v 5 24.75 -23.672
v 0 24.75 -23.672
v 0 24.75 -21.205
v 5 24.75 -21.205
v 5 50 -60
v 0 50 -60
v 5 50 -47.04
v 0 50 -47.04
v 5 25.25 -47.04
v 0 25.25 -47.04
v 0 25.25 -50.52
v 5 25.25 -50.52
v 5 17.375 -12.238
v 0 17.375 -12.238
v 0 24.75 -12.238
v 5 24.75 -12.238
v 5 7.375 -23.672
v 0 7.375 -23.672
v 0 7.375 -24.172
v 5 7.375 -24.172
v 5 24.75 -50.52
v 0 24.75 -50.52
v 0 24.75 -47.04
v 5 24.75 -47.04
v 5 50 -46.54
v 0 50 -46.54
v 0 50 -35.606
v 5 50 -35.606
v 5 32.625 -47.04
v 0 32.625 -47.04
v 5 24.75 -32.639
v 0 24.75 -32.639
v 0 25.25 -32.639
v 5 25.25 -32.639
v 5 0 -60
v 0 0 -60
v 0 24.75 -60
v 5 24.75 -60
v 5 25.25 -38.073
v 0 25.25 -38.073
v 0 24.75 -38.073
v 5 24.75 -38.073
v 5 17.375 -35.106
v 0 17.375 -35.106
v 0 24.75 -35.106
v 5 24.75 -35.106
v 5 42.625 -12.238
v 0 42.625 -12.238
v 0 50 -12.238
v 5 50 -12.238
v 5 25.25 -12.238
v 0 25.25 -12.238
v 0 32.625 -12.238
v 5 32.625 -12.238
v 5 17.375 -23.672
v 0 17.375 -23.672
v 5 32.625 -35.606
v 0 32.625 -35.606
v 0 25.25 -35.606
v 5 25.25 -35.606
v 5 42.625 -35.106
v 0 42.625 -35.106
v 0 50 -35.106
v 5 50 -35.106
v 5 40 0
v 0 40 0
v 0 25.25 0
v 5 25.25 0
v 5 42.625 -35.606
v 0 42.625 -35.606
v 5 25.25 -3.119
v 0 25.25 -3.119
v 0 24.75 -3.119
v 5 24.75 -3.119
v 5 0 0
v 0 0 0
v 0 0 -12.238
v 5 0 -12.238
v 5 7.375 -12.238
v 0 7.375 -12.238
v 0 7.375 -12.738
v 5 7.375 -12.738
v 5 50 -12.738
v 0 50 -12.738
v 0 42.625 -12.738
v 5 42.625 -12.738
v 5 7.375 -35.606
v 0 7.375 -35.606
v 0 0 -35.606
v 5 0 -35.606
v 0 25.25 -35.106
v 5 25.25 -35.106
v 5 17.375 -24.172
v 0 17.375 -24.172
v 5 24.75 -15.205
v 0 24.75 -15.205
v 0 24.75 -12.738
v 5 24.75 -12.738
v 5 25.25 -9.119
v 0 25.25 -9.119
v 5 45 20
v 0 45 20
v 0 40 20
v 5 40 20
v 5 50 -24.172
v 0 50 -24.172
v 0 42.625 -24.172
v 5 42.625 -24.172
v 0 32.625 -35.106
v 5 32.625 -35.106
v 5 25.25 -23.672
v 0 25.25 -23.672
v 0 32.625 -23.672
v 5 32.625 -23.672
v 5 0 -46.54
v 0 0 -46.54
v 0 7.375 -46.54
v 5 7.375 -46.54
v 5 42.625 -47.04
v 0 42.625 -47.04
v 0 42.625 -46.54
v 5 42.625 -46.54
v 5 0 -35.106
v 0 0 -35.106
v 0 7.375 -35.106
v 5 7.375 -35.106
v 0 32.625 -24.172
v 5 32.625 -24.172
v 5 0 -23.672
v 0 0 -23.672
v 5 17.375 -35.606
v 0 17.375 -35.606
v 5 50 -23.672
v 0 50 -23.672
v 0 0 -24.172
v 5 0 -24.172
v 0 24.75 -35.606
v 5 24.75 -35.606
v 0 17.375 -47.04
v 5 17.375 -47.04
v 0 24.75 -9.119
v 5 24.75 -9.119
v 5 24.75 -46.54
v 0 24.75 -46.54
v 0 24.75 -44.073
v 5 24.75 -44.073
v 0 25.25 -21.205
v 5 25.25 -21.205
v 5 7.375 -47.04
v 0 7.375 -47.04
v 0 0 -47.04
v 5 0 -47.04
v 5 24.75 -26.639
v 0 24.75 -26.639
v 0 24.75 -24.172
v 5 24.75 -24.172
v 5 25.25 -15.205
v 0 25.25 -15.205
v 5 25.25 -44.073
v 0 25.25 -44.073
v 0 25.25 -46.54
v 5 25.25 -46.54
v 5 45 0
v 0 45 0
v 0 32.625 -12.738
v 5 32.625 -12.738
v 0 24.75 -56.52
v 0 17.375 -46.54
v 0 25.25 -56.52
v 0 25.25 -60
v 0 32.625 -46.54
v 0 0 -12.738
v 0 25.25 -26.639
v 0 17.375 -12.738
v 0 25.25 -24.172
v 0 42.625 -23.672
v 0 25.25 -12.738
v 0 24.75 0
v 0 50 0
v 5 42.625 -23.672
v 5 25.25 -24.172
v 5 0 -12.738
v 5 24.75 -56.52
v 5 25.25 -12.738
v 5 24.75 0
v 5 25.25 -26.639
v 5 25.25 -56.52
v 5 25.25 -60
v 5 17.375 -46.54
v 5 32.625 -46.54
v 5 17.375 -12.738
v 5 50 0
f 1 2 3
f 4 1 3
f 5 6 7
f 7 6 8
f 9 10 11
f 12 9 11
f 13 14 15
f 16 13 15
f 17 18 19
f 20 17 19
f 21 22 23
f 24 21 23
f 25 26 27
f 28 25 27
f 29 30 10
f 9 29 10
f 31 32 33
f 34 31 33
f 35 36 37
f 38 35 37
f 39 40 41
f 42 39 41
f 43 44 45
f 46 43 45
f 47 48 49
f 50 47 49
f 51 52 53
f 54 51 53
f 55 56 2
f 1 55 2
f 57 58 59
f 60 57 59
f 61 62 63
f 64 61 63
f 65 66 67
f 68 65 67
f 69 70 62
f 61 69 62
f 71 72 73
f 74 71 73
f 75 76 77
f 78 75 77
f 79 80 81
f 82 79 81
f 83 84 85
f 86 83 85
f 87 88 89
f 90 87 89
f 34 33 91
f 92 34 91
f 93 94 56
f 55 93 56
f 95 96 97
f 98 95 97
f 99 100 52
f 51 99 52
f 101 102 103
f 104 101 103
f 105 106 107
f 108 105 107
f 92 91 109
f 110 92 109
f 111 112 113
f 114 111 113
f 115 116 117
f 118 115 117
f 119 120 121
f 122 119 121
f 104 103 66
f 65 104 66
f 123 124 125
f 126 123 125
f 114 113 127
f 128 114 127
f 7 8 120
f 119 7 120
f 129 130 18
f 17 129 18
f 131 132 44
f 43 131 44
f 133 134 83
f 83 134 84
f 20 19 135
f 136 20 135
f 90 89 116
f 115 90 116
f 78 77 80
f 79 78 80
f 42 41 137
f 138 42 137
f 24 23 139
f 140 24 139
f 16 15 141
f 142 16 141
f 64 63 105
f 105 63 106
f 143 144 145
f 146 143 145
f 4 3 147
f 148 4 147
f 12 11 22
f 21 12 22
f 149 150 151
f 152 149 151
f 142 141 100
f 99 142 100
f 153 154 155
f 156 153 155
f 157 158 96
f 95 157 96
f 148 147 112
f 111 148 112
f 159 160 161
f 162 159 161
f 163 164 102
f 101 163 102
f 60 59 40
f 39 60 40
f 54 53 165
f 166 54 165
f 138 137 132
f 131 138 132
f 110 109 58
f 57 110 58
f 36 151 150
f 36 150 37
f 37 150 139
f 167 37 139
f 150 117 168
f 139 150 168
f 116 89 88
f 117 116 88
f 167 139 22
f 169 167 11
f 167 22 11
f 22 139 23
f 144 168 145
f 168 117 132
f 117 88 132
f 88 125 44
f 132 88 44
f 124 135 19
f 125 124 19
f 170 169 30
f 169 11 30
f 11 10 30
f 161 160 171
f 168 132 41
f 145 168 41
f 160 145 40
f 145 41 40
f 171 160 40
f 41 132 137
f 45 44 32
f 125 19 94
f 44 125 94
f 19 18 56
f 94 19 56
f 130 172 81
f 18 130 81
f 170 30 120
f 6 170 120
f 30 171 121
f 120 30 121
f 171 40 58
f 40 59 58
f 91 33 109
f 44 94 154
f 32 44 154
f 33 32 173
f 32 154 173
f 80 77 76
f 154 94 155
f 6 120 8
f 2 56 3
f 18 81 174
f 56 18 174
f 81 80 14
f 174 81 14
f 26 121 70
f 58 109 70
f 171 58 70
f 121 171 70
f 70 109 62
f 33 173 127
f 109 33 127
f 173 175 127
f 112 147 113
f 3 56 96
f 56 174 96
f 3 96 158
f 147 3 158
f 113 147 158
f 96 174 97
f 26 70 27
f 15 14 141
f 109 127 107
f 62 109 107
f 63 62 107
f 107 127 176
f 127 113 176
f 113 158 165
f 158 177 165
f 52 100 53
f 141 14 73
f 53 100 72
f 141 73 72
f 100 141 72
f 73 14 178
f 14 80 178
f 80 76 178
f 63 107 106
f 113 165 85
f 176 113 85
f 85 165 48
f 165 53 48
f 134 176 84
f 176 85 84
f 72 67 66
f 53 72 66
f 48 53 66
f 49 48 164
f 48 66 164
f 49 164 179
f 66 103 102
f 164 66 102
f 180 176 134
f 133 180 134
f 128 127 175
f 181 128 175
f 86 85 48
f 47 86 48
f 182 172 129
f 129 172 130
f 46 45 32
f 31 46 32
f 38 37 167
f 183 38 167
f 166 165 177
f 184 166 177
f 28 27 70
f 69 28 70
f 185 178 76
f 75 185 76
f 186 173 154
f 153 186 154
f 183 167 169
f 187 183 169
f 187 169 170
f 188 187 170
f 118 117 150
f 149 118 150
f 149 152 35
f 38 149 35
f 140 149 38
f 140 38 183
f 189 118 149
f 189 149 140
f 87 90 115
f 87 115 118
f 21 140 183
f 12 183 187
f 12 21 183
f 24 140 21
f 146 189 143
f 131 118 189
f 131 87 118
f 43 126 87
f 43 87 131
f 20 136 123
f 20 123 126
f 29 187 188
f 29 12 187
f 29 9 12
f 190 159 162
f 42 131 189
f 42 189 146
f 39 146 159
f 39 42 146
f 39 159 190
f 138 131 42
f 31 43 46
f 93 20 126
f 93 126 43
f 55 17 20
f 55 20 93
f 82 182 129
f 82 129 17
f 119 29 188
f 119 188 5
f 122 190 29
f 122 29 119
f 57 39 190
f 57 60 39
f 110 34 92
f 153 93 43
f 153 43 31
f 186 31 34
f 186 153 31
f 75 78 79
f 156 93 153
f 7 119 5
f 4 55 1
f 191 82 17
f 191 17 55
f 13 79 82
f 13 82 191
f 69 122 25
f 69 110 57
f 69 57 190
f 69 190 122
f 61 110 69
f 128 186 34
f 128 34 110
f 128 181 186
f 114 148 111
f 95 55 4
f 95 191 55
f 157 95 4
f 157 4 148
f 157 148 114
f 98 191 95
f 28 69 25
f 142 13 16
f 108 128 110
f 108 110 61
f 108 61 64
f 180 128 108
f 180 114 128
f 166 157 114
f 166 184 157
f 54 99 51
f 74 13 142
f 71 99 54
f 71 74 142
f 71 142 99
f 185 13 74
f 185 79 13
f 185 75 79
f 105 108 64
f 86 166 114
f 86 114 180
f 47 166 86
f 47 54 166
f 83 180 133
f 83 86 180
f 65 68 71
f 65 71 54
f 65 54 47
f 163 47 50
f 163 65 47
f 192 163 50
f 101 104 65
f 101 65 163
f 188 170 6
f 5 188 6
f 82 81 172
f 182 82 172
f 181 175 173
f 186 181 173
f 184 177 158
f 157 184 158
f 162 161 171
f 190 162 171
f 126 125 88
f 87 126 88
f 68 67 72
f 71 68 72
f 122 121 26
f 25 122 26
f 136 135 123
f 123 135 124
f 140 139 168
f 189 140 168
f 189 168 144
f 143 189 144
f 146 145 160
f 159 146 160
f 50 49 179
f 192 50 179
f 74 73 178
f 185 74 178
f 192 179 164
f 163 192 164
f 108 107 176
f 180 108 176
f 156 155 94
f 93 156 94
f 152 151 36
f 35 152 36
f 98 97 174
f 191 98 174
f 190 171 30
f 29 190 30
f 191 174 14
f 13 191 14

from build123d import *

# Parameters (mm, degrees)
F1_DEPTH = 5


# Not quite as in the source:
# - a feature names something its author has since deleted; it is built from what else it names


with BuildPart() as f1:
    # F0 (on Right) → F1 (new body)
    with BuildSketch(Plane.YZ):
        Polygon((11.5, 0), (0, 0), (0, -12.238), (7.3750000447, -12.238), (7.3750000447, -12.738), (0, -12.738), (0, -23.672), (7.3750000447, -23.672), (7.3750000447, -24.172), (0, -24.172), (0, -35.106), (7.3750000447, -35.106), (7.3750000447, -35.606), (0, -35.606), (0, -46.54), (7.3750000447, -46.54), (7.3750000447, -47.04), (0, -47.04), (0, -60), (24.75, -60), (24.75, -56.52), (25.25, -56.52), (25.25, -60), (50, -60), (50, -47.04), (42.6249988377, -47.04), (42.6249988377, -46.54), (50, -46.54), (50, -35.606), (42.6249988377, -35.606), (42.6249988377, -35.106), (50, -35.106), (50, -24.172), (42.6249988377, -24.172), (42.6249988377, -23.672), (50, -23.672), (50, -12.738), (42.6249988377, -12.738), (42.6249988377, -12.238), (50, -12.238), (50, 0), (45, 0), (45, 15), (45, 19.999999553), (40, 19.999999553), (40, 15), (40, 0), (37.625, 0), (35.125, 0), (25.25, 0), (25.25, -1.304), (25.25, -3.119), (24.75, -3.119), (24.75, 0), (14.875, 0), (12.375, 0), align=None)
        Polygon((25.25, -44.073), (25.25, -46.54), (32.625, -46.54), (32.625, -47.04), (25.25, -47.04), (25.25, -50.52), (24.75, -50.52), (24.75, -47.04), (17.375, -47.04), (17.375, -46.54), (24.75, -46.54), (24.75, -44.073), align=None, mode=Mode.SUBTRACT)
        Polygon((25.25, -32.639), (25.25, -35.106), (32.625, -35.106), (32.625, -35.606), (25.25, -35.606), (25.25, -38.073), (24.75, -38.073), (24.75, -35.606), (17.375, -35.606), (17.375, -35.106), (24.75, -35.106), (24.75, -32.639), align=None, mode=Mode.SUBTRACT)
        Polygon((25.25, -21.205), (25.25, -23.672), (32.625, -23.672), (32.625, -24.172), (25.25, -24.172), (25.25, -26.639), (24.75, -26.639), (24.75, -24.172), (17.375, -24.172), (17.375, -23.672), (24.75, -23.672), (24.75, -21.205), align=None, mode=Mode.SUBTRACT)
        Polygon((25.25, -9.119), (25.25, -12.238), (32.625, -12.238), (32.625, -12.738), (25.25, -12.738), (25.25, -15.205), (24.75, -15.205), (24.75, -12.738), (17.375, -12.738), (17.375, -12.238), (24.75, -12.238), (24.75, -9.119), align=None, mode=Mode.SUBTRACT)
    extrude(amount=F1_DEPTH)


solid = f1.part
